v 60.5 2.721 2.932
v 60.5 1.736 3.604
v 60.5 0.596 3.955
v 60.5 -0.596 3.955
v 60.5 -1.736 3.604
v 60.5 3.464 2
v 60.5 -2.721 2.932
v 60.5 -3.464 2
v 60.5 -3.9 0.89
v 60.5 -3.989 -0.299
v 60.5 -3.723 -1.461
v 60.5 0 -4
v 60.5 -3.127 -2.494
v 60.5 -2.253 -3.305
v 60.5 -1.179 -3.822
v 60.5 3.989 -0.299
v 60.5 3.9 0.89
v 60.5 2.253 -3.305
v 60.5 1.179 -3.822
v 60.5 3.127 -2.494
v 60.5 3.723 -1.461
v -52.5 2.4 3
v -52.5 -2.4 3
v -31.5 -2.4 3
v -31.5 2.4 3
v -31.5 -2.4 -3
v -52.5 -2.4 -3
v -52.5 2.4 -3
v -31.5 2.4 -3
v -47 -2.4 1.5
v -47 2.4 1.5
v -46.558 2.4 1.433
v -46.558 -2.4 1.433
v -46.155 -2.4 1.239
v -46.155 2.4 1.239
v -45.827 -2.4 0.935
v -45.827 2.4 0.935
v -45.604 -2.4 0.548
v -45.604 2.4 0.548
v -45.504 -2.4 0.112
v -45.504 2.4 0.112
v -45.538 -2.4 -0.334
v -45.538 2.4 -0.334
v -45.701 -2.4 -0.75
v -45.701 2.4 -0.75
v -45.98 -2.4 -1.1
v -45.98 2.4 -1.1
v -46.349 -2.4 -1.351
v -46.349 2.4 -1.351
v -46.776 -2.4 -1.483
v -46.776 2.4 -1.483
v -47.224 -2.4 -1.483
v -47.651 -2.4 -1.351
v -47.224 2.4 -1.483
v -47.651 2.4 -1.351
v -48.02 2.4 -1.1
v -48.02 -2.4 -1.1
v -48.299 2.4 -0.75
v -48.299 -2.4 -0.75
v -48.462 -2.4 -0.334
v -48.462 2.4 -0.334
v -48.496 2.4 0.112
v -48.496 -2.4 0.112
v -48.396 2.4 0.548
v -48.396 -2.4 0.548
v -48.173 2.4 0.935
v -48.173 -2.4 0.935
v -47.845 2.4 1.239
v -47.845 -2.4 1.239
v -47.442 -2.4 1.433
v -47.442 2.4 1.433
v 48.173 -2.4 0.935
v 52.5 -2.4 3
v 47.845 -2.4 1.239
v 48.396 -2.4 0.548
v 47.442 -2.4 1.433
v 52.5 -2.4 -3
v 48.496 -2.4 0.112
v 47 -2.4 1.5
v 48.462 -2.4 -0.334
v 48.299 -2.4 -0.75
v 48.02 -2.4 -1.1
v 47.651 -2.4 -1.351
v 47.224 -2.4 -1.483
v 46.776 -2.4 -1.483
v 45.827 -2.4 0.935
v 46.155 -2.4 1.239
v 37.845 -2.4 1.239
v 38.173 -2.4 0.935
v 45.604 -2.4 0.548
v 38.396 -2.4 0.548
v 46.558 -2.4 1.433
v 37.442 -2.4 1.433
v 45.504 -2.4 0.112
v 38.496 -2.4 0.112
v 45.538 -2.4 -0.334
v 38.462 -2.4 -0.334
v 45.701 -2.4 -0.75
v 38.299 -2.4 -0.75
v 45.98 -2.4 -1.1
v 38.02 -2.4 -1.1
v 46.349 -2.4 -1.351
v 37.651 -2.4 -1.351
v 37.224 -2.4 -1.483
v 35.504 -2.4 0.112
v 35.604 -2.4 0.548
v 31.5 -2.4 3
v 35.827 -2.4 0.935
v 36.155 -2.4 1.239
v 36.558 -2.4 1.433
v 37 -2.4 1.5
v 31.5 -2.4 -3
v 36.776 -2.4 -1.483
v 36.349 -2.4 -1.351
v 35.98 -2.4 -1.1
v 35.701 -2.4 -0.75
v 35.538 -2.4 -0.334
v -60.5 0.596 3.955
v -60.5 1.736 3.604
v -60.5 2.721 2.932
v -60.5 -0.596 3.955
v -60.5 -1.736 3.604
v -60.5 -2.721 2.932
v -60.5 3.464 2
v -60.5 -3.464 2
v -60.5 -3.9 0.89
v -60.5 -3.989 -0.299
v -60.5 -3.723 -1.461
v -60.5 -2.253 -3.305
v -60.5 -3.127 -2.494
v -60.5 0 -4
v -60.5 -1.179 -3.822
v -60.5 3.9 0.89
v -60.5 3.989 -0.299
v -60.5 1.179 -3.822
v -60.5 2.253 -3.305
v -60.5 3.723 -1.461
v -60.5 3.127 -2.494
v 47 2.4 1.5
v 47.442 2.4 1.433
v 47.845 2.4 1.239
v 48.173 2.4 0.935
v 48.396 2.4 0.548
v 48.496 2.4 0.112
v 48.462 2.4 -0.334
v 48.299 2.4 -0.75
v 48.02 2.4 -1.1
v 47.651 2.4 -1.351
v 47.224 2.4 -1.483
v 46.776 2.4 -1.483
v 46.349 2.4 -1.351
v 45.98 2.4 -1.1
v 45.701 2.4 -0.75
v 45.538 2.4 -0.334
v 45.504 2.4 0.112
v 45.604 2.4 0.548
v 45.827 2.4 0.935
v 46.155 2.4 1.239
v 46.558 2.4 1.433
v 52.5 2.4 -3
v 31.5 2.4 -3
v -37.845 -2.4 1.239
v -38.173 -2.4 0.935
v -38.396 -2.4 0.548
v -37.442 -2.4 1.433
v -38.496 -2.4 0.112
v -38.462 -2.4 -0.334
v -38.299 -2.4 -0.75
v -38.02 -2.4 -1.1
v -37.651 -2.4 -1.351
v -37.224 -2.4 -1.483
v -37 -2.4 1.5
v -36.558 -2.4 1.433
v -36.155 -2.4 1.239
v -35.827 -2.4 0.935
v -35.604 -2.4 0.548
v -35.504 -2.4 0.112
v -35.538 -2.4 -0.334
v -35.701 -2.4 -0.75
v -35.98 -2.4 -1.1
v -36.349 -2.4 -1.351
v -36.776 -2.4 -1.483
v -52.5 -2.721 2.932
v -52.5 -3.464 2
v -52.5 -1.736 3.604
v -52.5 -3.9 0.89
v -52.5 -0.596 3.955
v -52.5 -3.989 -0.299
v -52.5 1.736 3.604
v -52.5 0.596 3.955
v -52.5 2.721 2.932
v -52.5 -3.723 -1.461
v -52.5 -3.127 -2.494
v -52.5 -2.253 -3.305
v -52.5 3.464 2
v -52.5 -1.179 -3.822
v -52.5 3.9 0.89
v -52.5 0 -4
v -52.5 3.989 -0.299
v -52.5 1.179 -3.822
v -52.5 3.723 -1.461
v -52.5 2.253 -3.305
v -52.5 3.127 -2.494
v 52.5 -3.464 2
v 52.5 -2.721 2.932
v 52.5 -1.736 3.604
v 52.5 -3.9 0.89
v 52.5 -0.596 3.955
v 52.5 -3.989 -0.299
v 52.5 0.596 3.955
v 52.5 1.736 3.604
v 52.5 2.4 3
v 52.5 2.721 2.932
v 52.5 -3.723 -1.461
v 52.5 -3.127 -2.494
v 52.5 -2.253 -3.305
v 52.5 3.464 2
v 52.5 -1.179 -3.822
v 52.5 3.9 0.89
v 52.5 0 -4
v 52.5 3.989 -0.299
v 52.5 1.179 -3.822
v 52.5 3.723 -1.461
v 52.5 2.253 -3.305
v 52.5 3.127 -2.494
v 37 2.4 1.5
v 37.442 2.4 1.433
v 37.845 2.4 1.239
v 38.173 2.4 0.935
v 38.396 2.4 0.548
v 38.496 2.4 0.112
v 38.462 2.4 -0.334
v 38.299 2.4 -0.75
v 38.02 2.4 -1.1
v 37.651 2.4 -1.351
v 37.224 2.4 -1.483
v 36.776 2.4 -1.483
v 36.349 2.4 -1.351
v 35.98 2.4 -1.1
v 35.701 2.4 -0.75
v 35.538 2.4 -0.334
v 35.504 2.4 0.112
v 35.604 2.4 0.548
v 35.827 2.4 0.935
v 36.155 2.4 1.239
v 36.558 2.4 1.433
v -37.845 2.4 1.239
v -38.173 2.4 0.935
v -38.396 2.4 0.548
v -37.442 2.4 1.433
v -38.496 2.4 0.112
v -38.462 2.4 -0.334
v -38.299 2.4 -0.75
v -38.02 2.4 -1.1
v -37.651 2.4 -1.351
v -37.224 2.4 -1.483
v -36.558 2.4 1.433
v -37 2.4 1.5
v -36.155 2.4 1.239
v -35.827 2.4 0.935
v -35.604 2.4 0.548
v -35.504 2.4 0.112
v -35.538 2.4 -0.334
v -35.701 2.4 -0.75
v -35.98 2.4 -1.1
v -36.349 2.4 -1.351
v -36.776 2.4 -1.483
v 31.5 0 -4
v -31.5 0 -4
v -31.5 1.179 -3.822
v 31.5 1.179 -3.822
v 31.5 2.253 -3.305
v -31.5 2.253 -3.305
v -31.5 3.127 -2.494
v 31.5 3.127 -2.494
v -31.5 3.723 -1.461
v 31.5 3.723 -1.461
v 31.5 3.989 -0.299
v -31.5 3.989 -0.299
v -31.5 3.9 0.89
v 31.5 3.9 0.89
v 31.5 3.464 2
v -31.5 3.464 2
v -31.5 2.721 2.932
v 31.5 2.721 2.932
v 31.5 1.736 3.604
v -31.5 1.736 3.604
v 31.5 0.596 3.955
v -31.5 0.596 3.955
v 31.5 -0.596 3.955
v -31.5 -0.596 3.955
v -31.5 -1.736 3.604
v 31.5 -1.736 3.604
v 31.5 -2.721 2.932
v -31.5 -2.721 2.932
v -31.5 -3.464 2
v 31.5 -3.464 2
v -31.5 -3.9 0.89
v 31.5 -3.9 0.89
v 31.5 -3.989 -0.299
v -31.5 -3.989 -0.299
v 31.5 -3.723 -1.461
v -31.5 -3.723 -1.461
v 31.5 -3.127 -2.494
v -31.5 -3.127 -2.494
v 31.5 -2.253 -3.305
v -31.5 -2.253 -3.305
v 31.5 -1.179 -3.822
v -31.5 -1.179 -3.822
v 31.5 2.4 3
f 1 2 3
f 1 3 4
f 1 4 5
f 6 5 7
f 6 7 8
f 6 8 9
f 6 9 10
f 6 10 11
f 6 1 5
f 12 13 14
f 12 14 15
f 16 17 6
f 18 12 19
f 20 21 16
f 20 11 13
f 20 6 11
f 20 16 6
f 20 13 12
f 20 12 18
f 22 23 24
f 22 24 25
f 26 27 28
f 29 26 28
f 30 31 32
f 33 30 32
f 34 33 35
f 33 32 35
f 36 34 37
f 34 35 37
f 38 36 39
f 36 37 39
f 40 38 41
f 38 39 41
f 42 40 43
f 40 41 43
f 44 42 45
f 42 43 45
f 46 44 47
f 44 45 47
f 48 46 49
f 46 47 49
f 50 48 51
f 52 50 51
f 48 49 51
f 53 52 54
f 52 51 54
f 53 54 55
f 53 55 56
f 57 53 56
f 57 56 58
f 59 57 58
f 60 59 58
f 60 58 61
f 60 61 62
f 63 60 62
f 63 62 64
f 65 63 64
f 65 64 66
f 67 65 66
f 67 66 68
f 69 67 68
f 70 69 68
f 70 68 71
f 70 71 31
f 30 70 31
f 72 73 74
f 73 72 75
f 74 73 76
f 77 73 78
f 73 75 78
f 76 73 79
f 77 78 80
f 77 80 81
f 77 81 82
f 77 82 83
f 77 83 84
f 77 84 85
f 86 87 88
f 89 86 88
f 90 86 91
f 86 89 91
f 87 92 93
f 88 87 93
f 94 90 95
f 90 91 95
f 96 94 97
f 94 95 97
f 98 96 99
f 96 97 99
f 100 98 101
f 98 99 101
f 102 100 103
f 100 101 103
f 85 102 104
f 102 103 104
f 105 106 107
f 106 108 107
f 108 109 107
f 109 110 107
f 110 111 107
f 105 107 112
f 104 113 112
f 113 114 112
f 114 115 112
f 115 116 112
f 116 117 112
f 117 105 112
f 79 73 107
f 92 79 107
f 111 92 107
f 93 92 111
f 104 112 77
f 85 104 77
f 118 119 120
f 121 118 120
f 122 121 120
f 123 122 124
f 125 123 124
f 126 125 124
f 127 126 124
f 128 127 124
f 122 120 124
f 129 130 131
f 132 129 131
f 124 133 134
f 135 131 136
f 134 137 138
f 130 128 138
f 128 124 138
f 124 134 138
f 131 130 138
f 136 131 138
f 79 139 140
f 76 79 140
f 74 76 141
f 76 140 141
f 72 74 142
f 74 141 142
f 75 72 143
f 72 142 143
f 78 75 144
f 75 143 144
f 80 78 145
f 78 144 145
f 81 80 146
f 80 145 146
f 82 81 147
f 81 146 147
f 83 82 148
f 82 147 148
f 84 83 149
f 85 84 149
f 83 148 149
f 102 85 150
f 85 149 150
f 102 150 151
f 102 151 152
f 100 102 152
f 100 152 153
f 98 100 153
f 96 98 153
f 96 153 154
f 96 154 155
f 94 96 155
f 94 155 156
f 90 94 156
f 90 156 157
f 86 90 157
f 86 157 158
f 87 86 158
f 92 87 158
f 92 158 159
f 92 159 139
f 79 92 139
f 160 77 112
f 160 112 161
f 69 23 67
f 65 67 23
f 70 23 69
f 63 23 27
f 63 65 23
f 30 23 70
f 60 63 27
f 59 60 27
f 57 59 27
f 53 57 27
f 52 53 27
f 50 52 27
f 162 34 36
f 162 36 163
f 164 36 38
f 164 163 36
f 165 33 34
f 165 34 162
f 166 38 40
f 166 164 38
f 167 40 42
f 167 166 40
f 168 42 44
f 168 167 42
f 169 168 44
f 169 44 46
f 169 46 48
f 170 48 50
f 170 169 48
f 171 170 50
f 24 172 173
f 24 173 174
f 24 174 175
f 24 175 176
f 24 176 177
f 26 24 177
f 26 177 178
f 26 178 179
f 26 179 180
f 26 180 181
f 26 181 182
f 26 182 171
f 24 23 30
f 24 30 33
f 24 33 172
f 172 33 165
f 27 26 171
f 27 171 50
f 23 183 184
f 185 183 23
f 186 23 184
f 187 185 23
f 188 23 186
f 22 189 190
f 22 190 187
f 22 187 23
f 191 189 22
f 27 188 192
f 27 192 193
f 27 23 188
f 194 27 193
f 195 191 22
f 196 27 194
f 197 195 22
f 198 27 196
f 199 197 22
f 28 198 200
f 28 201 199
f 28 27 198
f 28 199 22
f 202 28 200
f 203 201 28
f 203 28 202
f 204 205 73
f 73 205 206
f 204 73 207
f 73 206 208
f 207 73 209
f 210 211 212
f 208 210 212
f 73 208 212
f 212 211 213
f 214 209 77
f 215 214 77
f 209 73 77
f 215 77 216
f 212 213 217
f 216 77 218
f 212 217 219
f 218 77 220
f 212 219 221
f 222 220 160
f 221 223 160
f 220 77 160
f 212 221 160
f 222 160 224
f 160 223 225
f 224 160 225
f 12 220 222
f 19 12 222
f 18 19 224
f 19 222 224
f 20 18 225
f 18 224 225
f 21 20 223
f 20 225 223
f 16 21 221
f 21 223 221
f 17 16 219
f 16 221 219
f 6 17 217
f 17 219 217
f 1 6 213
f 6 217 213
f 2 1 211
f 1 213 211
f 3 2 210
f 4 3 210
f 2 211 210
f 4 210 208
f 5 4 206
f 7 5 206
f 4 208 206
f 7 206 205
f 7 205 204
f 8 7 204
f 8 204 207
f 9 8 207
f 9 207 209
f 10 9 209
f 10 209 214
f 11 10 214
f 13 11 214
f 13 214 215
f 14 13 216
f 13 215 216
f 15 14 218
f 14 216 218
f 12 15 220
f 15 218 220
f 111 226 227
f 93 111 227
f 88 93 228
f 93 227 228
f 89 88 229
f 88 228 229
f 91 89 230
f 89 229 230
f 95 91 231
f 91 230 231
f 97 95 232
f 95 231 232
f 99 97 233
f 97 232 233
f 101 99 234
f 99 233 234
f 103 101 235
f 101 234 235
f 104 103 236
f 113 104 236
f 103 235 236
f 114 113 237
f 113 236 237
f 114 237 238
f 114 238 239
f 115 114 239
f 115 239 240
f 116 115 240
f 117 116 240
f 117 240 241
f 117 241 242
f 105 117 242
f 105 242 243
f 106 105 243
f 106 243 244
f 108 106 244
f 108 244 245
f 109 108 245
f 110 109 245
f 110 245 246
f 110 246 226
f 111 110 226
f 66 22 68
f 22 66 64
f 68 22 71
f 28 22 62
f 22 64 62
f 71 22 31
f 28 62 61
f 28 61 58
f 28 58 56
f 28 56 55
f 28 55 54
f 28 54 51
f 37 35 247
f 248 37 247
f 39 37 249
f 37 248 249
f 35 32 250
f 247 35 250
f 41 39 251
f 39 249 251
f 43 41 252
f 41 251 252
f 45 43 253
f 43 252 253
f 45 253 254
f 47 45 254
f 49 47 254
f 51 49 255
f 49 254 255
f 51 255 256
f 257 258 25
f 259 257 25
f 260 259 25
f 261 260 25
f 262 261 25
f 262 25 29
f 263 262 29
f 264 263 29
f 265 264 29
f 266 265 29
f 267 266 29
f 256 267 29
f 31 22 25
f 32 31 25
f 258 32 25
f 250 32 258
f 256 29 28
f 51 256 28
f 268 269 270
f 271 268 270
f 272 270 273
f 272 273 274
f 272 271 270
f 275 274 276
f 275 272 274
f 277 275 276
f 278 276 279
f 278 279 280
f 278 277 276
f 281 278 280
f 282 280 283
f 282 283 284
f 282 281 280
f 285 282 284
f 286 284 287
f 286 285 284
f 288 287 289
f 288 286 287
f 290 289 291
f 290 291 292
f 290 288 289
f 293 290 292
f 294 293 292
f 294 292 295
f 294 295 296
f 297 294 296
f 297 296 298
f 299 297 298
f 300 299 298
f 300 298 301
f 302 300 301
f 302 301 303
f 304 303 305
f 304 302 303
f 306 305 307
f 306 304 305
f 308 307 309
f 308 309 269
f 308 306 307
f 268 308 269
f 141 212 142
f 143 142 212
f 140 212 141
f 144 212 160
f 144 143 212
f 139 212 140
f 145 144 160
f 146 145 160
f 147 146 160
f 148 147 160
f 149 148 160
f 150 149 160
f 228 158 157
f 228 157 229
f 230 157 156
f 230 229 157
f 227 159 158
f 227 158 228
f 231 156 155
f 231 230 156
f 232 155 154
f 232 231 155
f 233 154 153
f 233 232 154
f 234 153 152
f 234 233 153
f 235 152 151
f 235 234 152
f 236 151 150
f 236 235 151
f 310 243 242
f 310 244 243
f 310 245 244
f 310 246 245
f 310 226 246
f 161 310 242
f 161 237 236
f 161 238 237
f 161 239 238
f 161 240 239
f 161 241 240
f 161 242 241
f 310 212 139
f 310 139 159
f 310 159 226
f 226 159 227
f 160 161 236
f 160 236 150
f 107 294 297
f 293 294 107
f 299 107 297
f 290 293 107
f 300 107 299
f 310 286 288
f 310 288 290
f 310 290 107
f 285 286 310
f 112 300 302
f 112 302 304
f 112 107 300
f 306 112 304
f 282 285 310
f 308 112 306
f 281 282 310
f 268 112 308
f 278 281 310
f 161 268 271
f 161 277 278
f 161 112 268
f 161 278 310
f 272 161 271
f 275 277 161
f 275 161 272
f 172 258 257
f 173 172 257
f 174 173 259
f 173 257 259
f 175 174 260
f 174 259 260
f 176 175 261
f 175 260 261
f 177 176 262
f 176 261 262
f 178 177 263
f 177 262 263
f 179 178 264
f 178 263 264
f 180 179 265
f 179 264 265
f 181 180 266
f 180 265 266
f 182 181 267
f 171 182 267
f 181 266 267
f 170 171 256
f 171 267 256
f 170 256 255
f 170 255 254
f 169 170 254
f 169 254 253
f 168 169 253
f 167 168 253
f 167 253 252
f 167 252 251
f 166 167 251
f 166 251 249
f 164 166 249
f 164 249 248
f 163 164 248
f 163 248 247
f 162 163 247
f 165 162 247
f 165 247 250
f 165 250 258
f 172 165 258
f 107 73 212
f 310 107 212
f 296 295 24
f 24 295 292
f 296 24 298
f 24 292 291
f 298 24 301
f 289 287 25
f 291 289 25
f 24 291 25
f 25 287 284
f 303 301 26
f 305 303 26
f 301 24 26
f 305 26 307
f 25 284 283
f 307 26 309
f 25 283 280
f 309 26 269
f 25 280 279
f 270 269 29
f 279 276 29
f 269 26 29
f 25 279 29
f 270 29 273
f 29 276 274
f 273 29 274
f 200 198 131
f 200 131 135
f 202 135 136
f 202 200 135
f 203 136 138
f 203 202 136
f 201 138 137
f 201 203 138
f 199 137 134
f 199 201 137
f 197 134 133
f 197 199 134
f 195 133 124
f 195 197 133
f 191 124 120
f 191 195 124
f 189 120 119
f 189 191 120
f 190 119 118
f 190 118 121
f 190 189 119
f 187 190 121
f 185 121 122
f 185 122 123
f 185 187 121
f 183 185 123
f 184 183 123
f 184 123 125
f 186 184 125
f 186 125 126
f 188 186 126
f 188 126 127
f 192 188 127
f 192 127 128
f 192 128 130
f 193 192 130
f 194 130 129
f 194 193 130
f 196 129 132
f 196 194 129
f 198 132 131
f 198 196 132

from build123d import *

# Parameters (mm, degrees)
SKETCH1_R           = 4
BOSS_EXTRUDE1_DEPTH = 31.5
SKETCH2_W           = 6
SKETCH2_H           = 4.8
BOSS_EXTRUDE2_DEPTH = 21
SKETCH3_R           = 4
BOSS_EXTRUDE3_DEPTH = 8
SKETCH4_R           = 1.5
CUT_EXTRUDE1_DEPTH  = 61.968926512


with BuildPart() as part:
    # Sketch1 → Boss-Extrude1 (new body)
    with BuildSketch(Plane(origin=(0, 0, 0), x_dir=(0, 0, -1), z_dir=(1, 0, 0))):
        Circle(SKETCH1_R)
    boss_extrude1 = extrude(amount=BOSS_EXTRUDE1_DEPTH)

    # Sketch2 → Boss-Extrude2 (add)
    with BuildSketch(Plane(origin=(31.5, 0, 0), x_dir=(0, 0, -1), z_dir=(1, 0, 0))):
        Rectangle(SKETCH2_W, SKETCH2_H)
    boss_extrude2 = extrude(amount=BOSS_EXTRUDE2_DEPTH)

    # Sketch3 → Boss-Extrude3 (add)
    with BuildSketch(Plane(origin=(52.5, 0, 0), x_dir=(0, 0, -1), z_dir=(1, 0, 0))):
        Circle(SKETCH3_R)
    boss_extrude3 = extrude(amount=BOSS_EXTRUDE3_DEPTH)

    # Mirror1: Boss-Extrude1, Boss-Extrude2, Boss-Extrude3 across plane
    add(boss_extrude1.mirror(Plane(origin=(0, 0, 0), x_dir=(0, 0, 1), z_dir=(1, 0, 0))))
    add(boss_extrude2.mirror(Plane(origin=(0, 0, 0), x_dir=(0, 0, 1), z_dir=(1, 0, 0))))
    add(boss_extrude3.mirror(Plane(origin=(0, 0, 0), x_dir=(0, 0, 1), z_dir=(1, 0, 0))))

    # Sketch4 → Cut-Extrude1 (cut, through all)
    with BuildSketch(Plane(origin=(0, 2.4, 0), x_dir=(1, 0, 0), z_dir=(0, 1, 0))):
        with Locations((-47, 0)):
            Circle(SKETCH4_R)
        with Locations((-37, 0)):
            Circle(SKETCH4_R)
        with Locations((47, 0)):
            Circle(SKETCH4_R)
        with Locations((37, 0)):
            Circle(SKETCH4_R)
    extrude(amount=-CUT_EXTRUDE1_DEPTH, mode=Mode.SUBTRACT)


solid = part.part
